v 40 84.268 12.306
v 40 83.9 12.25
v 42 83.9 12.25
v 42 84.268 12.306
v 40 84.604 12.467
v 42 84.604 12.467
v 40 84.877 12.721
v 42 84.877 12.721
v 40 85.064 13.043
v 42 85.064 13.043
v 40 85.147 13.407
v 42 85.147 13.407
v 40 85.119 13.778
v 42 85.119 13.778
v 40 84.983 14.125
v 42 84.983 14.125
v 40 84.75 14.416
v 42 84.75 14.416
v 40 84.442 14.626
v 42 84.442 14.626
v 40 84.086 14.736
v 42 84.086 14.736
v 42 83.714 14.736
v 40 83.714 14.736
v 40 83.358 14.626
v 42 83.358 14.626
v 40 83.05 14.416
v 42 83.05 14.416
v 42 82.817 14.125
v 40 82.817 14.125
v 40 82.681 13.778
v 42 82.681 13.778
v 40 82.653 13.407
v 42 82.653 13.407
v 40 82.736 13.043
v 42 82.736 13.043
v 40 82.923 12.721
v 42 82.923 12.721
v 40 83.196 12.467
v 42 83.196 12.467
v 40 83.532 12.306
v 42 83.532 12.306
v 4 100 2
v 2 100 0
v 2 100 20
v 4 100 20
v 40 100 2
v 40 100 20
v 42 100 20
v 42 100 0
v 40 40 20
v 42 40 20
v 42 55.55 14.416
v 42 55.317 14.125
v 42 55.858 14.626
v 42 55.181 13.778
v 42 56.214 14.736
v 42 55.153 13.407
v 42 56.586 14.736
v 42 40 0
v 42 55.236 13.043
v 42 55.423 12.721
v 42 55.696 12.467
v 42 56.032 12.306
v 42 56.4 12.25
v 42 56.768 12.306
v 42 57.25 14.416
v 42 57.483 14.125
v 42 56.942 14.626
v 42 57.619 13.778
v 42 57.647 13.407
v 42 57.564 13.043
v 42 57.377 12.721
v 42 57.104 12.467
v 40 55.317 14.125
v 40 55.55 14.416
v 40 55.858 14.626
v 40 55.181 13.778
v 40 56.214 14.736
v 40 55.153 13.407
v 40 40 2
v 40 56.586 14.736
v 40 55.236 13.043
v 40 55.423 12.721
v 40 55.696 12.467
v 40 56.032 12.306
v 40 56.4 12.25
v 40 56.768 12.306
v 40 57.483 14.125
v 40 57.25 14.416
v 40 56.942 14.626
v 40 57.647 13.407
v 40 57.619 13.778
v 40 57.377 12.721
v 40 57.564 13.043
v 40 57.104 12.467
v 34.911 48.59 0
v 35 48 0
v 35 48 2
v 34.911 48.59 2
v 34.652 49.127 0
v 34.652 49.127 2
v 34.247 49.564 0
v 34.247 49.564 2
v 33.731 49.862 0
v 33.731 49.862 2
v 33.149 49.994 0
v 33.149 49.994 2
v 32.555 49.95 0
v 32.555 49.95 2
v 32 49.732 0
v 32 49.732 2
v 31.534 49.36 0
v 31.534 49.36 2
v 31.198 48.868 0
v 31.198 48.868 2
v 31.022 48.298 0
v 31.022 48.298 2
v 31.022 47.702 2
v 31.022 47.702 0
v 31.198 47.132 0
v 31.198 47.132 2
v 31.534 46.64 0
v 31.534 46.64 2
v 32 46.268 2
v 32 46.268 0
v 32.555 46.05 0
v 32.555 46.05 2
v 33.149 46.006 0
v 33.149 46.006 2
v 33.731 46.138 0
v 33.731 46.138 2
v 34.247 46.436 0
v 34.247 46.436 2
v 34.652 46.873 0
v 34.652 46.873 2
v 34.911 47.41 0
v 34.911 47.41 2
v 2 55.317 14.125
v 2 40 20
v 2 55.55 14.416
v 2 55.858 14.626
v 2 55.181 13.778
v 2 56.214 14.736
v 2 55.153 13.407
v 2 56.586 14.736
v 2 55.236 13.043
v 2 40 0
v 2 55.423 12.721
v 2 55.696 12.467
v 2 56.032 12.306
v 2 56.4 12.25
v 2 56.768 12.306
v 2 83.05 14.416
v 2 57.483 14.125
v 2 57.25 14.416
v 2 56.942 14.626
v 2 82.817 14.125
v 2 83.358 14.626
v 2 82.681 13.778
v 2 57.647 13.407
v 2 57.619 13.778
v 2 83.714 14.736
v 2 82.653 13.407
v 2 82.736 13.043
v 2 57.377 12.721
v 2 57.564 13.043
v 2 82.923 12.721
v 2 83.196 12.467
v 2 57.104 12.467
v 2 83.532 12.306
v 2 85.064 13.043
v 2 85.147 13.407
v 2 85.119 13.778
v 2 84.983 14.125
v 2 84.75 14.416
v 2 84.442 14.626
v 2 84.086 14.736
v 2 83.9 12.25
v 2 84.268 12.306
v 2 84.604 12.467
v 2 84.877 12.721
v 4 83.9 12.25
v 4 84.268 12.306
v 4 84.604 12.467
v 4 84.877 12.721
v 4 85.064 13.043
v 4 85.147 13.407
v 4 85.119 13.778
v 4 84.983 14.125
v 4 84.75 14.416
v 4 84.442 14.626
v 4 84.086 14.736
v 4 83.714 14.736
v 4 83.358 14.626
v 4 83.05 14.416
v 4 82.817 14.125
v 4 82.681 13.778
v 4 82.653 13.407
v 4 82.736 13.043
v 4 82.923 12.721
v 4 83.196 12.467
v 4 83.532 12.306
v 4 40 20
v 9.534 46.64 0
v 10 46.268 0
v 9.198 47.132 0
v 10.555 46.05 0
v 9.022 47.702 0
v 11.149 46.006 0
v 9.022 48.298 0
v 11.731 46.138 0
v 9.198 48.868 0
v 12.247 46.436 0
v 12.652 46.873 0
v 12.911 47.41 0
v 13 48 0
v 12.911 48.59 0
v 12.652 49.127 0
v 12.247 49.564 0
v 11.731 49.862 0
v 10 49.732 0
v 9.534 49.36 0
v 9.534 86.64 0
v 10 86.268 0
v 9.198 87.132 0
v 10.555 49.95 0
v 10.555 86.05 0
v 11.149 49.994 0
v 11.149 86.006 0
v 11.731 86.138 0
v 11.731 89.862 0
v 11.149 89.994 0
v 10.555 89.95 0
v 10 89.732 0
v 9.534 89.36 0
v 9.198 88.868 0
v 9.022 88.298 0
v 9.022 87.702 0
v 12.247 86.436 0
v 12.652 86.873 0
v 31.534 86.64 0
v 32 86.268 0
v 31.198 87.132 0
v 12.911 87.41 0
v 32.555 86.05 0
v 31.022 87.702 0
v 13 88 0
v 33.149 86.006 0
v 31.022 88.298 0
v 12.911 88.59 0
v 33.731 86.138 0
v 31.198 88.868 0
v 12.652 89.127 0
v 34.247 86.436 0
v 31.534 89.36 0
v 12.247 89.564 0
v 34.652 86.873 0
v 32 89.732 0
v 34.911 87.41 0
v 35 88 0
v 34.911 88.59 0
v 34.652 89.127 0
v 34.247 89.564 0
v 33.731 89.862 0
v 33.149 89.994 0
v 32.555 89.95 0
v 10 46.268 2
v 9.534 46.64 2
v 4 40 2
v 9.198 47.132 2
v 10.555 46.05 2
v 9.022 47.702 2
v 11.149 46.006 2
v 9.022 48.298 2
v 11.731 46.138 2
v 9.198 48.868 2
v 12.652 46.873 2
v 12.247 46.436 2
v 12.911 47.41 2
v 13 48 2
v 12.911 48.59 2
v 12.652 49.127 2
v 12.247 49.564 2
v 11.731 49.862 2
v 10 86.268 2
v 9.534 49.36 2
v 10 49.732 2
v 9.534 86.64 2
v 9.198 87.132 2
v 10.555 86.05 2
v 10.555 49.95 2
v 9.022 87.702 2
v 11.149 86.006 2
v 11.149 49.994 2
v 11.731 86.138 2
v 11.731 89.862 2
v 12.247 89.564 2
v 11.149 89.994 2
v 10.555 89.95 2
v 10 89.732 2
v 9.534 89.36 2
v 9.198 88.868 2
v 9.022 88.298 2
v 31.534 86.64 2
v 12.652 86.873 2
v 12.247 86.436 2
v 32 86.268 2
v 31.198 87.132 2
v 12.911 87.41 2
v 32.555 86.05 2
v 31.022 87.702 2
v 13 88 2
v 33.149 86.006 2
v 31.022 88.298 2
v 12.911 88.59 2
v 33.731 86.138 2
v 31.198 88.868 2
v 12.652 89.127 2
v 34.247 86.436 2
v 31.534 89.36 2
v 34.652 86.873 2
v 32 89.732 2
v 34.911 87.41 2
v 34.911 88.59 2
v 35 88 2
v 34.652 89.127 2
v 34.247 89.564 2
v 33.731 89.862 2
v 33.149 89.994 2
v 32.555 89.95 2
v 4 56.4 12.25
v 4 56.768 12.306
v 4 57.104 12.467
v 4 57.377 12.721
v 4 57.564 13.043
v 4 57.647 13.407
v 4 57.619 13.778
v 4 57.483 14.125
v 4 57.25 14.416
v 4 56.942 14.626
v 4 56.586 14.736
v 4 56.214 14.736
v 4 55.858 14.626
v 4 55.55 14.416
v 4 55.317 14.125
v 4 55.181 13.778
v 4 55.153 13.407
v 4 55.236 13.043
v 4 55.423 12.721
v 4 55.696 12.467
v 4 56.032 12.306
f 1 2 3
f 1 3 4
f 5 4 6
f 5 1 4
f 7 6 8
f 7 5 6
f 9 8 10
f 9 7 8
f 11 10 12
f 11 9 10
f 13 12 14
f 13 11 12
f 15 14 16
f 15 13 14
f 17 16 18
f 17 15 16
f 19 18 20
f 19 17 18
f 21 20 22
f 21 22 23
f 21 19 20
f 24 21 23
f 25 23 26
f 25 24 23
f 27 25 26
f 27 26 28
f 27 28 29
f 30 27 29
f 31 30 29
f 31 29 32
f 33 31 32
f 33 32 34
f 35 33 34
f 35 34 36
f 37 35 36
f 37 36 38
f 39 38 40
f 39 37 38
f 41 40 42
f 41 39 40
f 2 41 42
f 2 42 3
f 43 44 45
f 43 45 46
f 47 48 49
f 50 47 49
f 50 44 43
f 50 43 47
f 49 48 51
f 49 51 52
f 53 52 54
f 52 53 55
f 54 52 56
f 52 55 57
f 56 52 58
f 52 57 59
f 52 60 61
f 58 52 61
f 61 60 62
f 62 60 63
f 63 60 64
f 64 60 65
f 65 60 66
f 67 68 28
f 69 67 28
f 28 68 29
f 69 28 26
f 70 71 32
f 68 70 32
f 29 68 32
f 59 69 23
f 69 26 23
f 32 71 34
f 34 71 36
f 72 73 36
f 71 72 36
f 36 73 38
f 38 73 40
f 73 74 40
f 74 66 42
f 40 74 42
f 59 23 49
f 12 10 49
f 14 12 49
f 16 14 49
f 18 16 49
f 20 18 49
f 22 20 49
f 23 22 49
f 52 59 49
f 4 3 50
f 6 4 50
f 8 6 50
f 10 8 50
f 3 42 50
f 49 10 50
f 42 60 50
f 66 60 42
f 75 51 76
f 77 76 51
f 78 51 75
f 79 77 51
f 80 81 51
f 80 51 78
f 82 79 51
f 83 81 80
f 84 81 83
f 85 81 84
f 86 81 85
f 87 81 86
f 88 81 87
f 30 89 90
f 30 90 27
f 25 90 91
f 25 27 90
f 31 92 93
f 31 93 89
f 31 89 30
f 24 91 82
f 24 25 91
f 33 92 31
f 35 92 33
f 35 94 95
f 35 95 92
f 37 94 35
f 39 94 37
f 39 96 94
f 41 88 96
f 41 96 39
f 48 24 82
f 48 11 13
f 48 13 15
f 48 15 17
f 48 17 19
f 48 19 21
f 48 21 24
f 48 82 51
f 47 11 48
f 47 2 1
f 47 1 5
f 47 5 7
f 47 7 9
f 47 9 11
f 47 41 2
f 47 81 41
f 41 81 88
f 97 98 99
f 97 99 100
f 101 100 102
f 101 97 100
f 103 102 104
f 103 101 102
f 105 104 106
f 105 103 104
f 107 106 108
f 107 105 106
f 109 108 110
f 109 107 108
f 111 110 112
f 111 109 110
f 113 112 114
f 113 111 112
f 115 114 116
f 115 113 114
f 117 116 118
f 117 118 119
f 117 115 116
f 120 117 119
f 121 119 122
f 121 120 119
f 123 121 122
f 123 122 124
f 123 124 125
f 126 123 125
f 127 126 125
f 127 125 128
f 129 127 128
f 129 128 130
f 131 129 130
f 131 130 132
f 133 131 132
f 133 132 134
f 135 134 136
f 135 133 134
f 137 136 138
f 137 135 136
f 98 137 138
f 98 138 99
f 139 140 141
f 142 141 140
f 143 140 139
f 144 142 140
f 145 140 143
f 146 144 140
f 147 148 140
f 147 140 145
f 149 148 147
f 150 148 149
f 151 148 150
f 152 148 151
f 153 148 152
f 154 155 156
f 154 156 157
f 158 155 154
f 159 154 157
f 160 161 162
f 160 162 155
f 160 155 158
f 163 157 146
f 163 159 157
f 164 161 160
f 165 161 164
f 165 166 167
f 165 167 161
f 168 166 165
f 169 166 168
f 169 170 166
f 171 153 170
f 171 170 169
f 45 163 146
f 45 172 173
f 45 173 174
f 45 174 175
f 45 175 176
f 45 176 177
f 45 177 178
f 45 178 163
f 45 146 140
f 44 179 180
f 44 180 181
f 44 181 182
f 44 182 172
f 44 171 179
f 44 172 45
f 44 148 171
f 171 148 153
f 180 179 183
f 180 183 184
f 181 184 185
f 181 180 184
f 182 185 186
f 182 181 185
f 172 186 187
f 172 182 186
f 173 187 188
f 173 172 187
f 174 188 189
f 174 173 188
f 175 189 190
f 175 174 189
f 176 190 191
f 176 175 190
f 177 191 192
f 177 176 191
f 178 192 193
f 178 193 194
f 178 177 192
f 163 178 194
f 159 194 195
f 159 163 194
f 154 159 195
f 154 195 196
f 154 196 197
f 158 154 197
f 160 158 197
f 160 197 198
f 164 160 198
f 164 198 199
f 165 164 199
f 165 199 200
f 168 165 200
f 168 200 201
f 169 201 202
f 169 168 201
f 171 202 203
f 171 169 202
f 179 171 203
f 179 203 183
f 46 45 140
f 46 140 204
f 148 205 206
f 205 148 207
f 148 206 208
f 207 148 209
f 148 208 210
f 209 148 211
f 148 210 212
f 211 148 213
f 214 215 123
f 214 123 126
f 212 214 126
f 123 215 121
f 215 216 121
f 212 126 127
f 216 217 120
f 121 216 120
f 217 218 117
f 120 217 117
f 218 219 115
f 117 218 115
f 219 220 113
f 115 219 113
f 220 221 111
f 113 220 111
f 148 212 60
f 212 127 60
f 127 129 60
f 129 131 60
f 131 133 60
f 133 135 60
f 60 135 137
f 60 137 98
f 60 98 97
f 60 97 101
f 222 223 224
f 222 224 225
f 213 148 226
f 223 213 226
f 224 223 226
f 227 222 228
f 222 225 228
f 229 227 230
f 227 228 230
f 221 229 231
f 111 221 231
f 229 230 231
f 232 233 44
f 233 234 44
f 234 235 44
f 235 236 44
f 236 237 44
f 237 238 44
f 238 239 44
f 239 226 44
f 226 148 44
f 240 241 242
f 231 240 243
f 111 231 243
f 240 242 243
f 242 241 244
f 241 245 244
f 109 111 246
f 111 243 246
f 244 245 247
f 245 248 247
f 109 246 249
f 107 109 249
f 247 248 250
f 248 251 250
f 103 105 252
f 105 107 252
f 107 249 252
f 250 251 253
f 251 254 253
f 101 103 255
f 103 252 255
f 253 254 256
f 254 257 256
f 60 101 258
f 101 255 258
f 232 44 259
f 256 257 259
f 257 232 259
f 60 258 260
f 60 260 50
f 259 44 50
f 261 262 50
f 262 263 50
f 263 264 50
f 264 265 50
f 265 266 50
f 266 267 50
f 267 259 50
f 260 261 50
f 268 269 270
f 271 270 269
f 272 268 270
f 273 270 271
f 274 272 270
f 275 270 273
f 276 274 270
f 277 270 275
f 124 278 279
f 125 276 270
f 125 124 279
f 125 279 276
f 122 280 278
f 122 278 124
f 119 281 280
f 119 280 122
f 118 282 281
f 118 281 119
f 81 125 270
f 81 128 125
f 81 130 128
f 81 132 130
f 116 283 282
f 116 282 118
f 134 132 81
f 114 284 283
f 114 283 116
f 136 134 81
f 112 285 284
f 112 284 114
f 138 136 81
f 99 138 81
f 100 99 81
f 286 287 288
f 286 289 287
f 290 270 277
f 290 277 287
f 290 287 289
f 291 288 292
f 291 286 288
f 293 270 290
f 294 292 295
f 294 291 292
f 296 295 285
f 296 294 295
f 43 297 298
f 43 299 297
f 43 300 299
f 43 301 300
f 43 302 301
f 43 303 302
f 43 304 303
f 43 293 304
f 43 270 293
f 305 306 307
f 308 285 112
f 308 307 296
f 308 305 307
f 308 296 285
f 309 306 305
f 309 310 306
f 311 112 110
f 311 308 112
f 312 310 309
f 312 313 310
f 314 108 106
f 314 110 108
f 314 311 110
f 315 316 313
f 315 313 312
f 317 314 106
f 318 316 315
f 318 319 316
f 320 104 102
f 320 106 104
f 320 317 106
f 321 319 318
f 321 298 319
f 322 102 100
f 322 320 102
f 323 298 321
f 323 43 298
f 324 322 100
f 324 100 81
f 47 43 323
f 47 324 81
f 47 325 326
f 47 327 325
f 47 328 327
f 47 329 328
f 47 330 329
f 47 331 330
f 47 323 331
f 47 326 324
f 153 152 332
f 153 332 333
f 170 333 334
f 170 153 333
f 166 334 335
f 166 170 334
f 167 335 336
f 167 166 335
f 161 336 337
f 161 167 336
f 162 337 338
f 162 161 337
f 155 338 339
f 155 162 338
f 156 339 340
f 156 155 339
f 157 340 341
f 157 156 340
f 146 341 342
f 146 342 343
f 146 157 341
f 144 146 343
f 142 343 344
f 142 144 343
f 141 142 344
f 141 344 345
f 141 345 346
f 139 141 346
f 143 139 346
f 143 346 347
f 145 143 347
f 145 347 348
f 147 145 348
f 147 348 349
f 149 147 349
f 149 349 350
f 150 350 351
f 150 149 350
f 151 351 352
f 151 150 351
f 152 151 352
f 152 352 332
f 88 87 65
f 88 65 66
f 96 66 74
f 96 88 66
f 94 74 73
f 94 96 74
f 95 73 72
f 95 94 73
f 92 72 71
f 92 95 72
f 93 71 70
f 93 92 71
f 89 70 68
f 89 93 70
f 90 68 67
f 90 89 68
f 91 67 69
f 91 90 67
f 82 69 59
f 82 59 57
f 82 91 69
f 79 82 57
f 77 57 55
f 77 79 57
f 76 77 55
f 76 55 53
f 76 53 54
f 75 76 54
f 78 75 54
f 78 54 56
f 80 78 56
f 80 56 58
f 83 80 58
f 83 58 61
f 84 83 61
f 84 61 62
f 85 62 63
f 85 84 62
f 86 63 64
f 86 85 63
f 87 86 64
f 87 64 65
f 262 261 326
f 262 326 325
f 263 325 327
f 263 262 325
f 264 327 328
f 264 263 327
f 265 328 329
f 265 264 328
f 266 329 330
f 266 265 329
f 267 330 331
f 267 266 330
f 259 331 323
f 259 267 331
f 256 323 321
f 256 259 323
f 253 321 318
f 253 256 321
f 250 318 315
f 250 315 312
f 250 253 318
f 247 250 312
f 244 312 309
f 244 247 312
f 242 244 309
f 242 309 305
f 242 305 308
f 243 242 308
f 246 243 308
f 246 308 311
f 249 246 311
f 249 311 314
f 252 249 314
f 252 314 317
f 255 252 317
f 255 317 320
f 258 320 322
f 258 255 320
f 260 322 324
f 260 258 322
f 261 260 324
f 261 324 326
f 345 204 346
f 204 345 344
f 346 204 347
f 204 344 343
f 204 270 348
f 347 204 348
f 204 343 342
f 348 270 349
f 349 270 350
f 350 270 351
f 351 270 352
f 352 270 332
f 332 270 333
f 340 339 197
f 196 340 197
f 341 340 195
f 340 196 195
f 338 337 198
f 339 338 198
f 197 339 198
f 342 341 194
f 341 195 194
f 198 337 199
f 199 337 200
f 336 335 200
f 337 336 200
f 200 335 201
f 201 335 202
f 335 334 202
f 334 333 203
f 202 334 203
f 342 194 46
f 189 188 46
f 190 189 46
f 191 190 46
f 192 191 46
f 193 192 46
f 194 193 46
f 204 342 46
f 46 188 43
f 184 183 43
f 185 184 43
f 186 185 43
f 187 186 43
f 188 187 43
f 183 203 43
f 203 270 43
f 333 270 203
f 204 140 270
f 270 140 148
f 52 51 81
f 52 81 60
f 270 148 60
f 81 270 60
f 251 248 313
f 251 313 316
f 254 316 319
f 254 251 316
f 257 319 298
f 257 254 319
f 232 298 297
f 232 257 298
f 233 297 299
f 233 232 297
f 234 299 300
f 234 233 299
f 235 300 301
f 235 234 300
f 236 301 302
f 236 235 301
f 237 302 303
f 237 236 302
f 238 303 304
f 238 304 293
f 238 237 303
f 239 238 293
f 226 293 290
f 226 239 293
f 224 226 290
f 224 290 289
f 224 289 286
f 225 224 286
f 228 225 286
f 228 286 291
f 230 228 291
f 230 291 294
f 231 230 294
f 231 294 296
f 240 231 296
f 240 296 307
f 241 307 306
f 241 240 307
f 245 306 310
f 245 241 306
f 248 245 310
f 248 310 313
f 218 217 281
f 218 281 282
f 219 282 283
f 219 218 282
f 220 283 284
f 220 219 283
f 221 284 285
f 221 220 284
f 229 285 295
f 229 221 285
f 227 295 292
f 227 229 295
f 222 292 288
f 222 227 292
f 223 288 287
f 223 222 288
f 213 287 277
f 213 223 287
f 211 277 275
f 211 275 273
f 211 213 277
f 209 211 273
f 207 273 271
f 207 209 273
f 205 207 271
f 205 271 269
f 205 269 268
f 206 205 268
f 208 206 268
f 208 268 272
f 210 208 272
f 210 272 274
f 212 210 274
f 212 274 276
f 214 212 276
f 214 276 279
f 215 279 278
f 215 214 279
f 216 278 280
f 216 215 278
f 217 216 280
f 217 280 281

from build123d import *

# Parameters (mm, degrees)
CYLINDER_R           = 1.25
CYLINDER_DEPTH       = 2
CYLINDER_PITCH_ANGLE = 90
ARRAY_X_COUNT        = 2
ARRAY_X_PITCH        = 38
ARRAY_Y_COUNT        = 2
ARRAY_Y_PITCH        = 27.5
CYLINDER001_R        = 2
CYLINDER001_DEPTH    = 2
ARRAY001_X_COUNT     = 2
ARRAY001_X_PITCH     = 22
ARRAY001_Y_COUNT     = 2
ARRAY001_Y_PITCH     = 40
BOX001_W             = 2
BOX001_H             = 60
BOX001_DEPTH         = 20
BOX_W                = 40
BOX_H                = 60
BOX_DEPTH            = 2
BOX002_W             = 2
BOX002_H             = 60
BOX002_DEPTH         = 20


with BuildPart() as array:
    # Cylinder → Cylinder (new body)
    with BuildSketch(Plane.XY):
        Circle(CYLINDER_R)
    extrude(amount=CYLINDER_DEPTH)


with BuildPart() as array_1:
    # Cylinder pitch: moved
    add(array.part.rotate(Axis((0, 0, 0), (0, 1, 0)), CYLINDER_PITCH_ANGLE))


with BuildPart() as array_2:
    # Cylinder placement: moved
    add(array_1.part.moved(Location((0, 16.4, 13.5))))

    # Array X: Array ×2


with BuildPart() as array_3:
    add(array_2.part)
    with Locations(*[(i * ARRAY_X_PITCH, 0, 0) for i in range(1, ARRAY_X_COUNT)]):
        add(array_2.part)

    # Array Y: Array ×2


with BuildPart() as array_4:
    add(array_3.part)
    with Locations(*[(0, i * ARRAY_Y_PITCH, 0) for i in range(1, ARRAY_Y_COUNT)]):
        add(array_3.part)


with BuildPart() as array_5:
    # Array placement: moved
    add(array_4.part.moved(Location((2, 40, 0))))


with BuildPart() as array001:
    # Cylinder001 → Cylinder001 (new body)
    with BuildSketch(Plane(origin=(11, 48, 0), x_dir=(1, 0, 0), z_dir=(0, 0, 1))):
        Circle(CYLINDER001_R)
    extrude(amount=CYLINDER001_DEPTH)

    # Array001 X: Array001 ×2


with BuildPart() as array001_1:
    add(array001.part)
    with Locations(*[(i * ARRAY001_X_PITCH, 0, 0) for i in range(1, ARRAY001_X_COUNT)]):
        add(array001.part)

    # Array001 Y: Array001 ×2


with BuildPart() as array001_2:
    add(array001_1.part)
    with Locations(*[(0, i * ARRAY001_Y_PITCH, 0) for i in range(1, ARRAY001_Y_COUNT)]):
        add(array001_1.part)


with BuildPart() as cubo001:
    # Box001 → Box001 (new body)
    with BuildSketch(Plane.XY):
        with Locations((1, 30)):
            Rectangle(BOX001_W, BOX001_H)
    extrude(amount=BOX001_DEPTH)


with BuildPart() as cubo:
    # Box → Box (new body)
    with BuildSketch(Plane.XY):
        with Locations((20, 30)):
            Rectangle(BOX_W, BOX_H)
    extrude(amount=BOX_DEPTH)


with BuildPart() as cut002:
    # Box002 → Box002 (new body)
    with BuildSketch(Plane(origin=(38, 0, 0), x_dir=(1, 0, 0), z_dir=(0, 0, 1))):
        with Locations((1, 30)):
            Rectangle(BOX002_W, BOX002_H)
    extrude(amount=BOX002_DEPTH)

    # Fusion: union Cubo001, Cubo
    add(cubo001.part)
    add(cubo.part)

    # Cut: cut Array
    add(array_5.part, mode=Mode.SUBTRACT)


with BuildPart() as cut002_1:
    # Cut placement: moved
    add(cut002.part.moved(Location((2, 40, 0))))

    # Cut001: cut Array001
    add(array001_2.part, mode=Mode.SUBTRACT)

    # Cut002: cut Array
    add(array_5.part, mode=Mode.SUBTRACT)


solid = cut002_1.part
